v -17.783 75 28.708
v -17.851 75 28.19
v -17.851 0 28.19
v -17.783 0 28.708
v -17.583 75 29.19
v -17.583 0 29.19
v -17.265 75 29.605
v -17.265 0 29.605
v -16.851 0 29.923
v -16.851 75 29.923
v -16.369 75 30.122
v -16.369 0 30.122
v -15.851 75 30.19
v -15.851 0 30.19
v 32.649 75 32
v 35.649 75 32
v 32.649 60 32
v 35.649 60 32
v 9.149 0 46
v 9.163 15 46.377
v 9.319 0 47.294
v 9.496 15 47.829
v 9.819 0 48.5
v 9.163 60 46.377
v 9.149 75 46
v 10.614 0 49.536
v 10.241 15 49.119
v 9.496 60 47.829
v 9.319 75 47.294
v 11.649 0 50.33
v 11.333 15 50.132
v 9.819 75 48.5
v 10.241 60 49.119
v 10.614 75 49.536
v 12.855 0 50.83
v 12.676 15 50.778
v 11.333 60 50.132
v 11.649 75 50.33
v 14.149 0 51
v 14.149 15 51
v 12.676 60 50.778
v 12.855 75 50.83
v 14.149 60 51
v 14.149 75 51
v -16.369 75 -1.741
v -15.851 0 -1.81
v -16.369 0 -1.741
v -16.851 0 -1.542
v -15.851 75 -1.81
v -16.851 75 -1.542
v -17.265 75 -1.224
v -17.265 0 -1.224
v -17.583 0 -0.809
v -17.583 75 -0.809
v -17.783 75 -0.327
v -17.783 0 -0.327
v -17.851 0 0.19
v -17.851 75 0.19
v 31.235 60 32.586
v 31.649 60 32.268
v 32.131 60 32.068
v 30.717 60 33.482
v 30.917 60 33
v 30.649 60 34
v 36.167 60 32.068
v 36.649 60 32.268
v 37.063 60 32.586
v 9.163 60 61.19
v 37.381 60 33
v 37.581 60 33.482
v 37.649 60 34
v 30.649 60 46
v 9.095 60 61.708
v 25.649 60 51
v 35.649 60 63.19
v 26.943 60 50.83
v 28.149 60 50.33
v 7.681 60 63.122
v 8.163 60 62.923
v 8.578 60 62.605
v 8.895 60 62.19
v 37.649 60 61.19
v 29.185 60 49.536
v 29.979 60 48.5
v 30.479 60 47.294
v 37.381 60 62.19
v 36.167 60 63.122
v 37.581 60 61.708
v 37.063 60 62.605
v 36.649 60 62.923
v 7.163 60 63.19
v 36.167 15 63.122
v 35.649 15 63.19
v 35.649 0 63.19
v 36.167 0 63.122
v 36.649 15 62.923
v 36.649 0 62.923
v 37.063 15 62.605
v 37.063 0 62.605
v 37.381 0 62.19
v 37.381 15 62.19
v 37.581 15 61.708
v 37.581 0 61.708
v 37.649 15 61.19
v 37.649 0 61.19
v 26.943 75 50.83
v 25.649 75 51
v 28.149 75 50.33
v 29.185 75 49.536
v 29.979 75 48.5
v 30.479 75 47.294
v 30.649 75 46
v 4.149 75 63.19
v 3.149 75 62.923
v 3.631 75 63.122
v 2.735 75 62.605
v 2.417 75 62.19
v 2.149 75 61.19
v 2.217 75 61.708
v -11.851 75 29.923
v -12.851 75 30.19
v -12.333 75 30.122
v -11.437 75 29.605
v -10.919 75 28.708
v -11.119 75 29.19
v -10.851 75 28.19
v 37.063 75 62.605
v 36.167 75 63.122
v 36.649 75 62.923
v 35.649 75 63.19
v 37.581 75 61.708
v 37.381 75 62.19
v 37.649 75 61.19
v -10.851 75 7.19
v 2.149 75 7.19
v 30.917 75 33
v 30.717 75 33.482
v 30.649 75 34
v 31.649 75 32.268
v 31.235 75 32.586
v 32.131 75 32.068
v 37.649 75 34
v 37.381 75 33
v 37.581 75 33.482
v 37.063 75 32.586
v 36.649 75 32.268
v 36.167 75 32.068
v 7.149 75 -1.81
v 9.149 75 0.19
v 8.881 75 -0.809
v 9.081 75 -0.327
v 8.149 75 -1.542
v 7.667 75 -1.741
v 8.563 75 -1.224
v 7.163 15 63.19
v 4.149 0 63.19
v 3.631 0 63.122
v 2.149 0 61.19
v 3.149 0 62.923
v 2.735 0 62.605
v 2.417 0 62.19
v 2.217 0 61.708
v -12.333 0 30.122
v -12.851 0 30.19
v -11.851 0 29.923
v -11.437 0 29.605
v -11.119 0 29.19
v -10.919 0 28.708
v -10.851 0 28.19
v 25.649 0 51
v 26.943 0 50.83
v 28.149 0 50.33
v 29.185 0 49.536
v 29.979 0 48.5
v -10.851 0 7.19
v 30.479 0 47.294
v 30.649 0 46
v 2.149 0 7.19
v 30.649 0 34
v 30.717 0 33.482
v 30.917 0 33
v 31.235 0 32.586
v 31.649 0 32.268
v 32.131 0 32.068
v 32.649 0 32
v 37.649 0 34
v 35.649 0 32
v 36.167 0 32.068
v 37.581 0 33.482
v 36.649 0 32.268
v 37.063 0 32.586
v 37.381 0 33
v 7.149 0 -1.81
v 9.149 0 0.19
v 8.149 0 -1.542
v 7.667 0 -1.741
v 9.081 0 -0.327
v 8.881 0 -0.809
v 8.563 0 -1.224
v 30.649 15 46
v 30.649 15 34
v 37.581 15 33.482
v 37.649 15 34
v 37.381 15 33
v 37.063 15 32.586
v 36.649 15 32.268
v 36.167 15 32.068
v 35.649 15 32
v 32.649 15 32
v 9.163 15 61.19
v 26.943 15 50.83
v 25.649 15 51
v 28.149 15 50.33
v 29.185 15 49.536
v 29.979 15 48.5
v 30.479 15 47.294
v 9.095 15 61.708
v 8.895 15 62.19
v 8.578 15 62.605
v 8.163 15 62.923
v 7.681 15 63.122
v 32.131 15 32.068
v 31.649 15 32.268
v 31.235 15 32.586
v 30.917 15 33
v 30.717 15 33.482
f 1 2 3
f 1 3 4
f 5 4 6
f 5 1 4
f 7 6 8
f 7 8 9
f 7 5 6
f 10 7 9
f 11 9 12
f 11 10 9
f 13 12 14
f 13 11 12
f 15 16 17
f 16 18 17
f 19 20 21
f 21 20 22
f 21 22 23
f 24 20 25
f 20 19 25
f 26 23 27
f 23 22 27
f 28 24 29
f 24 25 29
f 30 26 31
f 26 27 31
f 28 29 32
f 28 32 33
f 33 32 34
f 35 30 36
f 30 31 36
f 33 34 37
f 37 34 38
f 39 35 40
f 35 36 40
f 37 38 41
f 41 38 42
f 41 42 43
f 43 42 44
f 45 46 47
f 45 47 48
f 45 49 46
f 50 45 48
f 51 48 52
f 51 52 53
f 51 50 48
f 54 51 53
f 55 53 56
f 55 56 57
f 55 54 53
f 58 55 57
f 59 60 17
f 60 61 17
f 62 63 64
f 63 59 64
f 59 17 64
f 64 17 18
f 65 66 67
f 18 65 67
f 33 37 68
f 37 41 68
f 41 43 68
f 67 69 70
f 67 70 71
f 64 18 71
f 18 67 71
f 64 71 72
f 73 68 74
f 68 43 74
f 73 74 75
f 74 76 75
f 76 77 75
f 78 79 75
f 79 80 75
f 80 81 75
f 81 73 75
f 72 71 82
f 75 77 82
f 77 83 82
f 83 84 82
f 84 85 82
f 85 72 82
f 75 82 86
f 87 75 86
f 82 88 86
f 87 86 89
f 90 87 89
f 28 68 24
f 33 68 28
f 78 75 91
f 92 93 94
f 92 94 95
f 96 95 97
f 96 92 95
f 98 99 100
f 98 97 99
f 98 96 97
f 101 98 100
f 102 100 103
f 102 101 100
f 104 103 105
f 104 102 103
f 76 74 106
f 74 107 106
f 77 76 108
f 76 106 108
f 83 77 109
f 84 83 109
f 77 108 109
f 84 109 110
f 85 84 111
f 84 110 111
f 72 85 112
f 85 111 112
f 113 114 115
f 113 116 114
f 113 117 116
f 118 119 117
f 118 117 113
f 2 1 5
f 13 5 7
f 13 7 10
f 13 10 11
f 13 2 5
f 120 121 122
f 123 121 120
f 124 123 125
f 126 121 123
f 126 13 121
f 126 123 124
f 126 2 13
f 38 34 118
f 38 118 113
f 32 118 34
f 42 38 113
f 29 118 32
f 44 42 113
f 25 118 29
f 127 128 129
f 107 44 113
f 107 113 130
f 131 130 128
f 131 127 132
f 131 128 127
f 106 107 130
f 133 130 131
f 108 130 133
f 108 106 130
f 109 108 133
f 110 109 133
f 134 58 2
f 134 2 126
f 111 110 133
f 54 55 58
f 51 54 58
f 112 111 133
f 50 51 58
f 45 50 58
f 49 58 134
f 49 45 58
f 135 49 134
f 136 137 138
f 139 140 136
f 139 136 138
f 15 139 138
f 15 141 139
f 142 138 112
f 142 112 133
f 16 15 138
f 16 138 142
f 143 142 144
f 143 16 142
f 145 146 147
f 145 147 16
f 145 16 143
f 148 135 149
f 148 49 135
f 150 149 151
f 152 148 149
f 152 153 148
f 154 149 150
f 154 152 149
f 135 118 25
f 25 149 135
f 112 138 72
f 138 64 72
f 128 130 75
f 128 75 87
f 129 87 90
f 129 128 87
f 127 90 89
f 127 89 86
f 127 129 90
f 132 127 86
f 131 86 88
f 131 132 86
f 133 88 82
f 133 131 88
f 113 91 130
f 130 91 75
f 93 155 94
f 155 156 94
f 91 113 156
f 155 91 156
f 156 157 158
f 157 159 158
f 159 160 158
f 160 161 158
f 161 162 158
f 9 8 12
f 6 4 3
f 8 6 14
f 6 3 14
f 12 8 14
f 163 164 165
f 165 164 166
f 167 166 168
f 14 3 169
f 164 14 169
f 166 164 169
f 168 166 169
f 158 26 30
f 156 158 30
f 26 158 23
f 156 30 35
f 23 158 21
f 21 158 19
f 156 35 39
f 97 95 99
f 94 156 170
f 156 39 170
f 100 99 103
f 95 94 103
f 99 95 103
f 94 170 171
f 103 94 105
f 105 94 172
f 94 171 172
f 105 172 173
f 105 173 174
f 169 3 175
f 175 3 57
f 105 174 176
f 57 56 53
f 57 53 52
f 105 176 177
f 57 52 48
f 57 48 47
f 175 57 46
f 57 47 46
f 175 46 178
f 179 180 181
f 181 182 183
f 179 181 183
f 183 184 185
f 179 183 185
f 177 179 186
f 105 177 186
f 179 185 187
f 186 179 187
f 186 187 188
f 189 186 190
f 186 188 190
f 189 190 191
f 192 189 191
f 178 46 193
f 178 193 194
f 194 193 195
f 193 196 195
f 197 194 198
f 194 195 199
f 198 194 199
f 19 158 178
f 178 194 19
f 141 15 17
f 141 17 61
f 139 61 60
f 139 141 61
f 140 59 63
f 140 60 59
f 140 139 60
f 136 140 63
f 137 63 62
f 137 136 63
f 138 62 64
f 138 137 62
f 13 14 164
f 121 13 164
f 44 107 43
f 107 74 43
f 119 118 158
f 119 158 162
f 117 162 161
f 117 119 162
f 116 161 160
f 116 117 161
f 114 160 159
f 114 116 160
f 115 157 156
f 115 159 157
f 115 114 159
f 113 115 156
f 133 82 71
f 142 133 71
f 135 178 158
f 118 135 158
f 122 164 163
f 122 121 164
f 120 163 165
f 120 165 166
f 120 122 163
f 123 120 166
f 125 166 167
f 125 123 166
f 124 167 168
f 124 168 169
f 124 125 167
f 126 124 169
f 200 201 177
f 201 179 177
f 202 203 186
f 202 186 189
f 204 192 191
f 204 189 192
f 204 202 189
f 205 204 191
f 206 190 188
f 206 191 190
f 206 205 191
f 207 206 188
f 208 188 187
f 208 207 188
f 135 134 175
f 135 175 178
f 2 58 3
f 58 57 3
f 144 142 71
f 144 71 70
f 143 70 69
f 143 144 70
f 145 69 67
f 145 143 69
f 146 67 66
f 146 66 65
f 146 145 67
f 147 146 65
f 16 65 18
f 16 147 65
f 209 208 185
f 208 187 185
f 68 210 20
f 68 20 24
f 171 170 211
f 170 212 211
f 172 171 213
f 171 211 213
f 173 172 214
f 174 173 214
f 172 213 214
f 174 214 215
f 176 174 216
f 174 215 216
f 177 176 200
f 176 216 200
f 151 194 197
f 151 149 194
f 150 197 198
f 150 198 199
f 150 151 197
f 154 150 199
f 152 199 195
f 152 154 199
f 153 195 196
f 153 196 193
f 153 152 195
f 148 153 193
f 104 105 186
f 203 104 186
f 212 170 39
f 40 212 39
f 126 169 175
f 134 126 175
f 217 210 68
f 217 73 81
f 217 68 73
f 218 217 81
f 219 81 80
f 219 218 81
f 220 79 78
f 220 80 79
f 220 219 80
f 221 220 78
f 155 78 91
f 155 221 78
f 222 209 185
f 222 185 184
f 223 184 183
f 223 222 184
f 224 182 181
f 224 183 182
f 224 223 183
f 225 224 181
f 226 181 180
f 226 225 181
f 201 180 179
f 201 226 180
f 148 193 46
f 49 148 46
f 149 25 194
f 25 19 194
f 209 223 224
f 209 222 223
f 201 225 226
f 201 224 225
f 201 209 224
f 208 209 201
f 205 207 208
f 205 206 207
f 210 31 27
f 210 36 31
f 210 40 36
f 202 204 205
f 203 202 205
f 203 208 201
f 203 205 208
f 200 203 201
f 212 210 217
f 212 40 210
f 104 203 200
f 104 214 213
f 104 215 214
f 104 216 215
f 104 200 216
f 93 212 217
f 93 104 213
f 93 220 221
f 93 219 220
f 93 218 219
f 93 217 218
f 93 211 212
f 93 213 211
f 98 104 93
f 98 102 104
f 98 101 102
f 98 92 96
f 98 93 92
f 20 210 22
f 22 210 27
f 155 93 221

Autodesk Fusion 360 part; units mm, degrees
sketch "Sketch1" plane through (0, 0, 0) normal (0, 1, 0) x (1, 0, 0)
  line L0 (-10.8509, -30.1905) -> (-10.8509, -7.1905)
  line L1 (-10.8509, -7.1905) -> (2.1491, -7.1905)
  line L2 (2.1491, -7.1905) -> (2.1491, -63.1905)
  line L3 (2.1491, -63.1905) -> (9.1491, -63.1905)
  line L4 (9.1491, -63.1905) -> (9.1491, 1.8095)
  line L5 (9.1491, 1.8095) -> (-17.8509, 1.8095)
  line L6 (-17.8509, 1.8095) -> (-17.8509, -30.1905)
  line L7 (-17.8509, -30.1905) -> (-10.8509, -30.1905)
  line L8 (9.1491, -63.1905) -> (38, -63.1905)
  line L9 (37.6491, -63.1989) -> (37.6491, -32)
  line L10 (37.6491, -32) -> (30.6491, -32)
  line L11 (30.6491, -32) -> (30.6491, -51)
  line L12 (30.6491, -51) -> (9.1491, -51)
  dimension "d11" = 65
  dimension "d15" = 27
  dimension "d16" = 7
  dimension "d17" = 13
  dimension "d18" = 23
  dimension "d24" = 35.5
  dimension "d28" = 21.5
  dimension "d29" = 7
  dimension "d37" = 32
extrude "Extrude2" add sketch "Sketch1" along normal blind 75 makes body 1
fillet "Fillet4" radius 5 2 edges at (9.1491, 37.5, 51) (30.6491, 37.5, 51) on bodies 1
box "BoxPrimitive1" add length 45 width 45 height 45 placed x (0, 0, 1) y (1, 0, 0) z (0, 1, 0) at (45, 0, 23) separate body makes body 2
move_body "Move9" bodies 2 to x (1, 0, 0) y (0, 1, 0) z (0, 0, 1) at (-35.8367, 15, -2.9383)
combine "Combine1" operation cut target body 1 tool bodies 2
fillet "Fillet5" radius 2 8 edges at (2.1491, 37.5, 63.1905) (37.6491, 7.5, 63.1905) (37.6491, 67.5, 63.1905) (9.1633, 37.5, 63.1905) (30.6491, 7.5, 32) (37.6491, 7.5, 32) (30.6491, 67.5, 32) (37.6491, 67.5, 32) on bodies 1
fillet "Fillet6" radius 2 4 edges at (-17.8509, 37.5, 30.1905) (9.1491, 37.5, -1.8095) (-17.8509, 37.5, -1.8095) (-10.8509, 37.5, 30.1905) on bodies 1
